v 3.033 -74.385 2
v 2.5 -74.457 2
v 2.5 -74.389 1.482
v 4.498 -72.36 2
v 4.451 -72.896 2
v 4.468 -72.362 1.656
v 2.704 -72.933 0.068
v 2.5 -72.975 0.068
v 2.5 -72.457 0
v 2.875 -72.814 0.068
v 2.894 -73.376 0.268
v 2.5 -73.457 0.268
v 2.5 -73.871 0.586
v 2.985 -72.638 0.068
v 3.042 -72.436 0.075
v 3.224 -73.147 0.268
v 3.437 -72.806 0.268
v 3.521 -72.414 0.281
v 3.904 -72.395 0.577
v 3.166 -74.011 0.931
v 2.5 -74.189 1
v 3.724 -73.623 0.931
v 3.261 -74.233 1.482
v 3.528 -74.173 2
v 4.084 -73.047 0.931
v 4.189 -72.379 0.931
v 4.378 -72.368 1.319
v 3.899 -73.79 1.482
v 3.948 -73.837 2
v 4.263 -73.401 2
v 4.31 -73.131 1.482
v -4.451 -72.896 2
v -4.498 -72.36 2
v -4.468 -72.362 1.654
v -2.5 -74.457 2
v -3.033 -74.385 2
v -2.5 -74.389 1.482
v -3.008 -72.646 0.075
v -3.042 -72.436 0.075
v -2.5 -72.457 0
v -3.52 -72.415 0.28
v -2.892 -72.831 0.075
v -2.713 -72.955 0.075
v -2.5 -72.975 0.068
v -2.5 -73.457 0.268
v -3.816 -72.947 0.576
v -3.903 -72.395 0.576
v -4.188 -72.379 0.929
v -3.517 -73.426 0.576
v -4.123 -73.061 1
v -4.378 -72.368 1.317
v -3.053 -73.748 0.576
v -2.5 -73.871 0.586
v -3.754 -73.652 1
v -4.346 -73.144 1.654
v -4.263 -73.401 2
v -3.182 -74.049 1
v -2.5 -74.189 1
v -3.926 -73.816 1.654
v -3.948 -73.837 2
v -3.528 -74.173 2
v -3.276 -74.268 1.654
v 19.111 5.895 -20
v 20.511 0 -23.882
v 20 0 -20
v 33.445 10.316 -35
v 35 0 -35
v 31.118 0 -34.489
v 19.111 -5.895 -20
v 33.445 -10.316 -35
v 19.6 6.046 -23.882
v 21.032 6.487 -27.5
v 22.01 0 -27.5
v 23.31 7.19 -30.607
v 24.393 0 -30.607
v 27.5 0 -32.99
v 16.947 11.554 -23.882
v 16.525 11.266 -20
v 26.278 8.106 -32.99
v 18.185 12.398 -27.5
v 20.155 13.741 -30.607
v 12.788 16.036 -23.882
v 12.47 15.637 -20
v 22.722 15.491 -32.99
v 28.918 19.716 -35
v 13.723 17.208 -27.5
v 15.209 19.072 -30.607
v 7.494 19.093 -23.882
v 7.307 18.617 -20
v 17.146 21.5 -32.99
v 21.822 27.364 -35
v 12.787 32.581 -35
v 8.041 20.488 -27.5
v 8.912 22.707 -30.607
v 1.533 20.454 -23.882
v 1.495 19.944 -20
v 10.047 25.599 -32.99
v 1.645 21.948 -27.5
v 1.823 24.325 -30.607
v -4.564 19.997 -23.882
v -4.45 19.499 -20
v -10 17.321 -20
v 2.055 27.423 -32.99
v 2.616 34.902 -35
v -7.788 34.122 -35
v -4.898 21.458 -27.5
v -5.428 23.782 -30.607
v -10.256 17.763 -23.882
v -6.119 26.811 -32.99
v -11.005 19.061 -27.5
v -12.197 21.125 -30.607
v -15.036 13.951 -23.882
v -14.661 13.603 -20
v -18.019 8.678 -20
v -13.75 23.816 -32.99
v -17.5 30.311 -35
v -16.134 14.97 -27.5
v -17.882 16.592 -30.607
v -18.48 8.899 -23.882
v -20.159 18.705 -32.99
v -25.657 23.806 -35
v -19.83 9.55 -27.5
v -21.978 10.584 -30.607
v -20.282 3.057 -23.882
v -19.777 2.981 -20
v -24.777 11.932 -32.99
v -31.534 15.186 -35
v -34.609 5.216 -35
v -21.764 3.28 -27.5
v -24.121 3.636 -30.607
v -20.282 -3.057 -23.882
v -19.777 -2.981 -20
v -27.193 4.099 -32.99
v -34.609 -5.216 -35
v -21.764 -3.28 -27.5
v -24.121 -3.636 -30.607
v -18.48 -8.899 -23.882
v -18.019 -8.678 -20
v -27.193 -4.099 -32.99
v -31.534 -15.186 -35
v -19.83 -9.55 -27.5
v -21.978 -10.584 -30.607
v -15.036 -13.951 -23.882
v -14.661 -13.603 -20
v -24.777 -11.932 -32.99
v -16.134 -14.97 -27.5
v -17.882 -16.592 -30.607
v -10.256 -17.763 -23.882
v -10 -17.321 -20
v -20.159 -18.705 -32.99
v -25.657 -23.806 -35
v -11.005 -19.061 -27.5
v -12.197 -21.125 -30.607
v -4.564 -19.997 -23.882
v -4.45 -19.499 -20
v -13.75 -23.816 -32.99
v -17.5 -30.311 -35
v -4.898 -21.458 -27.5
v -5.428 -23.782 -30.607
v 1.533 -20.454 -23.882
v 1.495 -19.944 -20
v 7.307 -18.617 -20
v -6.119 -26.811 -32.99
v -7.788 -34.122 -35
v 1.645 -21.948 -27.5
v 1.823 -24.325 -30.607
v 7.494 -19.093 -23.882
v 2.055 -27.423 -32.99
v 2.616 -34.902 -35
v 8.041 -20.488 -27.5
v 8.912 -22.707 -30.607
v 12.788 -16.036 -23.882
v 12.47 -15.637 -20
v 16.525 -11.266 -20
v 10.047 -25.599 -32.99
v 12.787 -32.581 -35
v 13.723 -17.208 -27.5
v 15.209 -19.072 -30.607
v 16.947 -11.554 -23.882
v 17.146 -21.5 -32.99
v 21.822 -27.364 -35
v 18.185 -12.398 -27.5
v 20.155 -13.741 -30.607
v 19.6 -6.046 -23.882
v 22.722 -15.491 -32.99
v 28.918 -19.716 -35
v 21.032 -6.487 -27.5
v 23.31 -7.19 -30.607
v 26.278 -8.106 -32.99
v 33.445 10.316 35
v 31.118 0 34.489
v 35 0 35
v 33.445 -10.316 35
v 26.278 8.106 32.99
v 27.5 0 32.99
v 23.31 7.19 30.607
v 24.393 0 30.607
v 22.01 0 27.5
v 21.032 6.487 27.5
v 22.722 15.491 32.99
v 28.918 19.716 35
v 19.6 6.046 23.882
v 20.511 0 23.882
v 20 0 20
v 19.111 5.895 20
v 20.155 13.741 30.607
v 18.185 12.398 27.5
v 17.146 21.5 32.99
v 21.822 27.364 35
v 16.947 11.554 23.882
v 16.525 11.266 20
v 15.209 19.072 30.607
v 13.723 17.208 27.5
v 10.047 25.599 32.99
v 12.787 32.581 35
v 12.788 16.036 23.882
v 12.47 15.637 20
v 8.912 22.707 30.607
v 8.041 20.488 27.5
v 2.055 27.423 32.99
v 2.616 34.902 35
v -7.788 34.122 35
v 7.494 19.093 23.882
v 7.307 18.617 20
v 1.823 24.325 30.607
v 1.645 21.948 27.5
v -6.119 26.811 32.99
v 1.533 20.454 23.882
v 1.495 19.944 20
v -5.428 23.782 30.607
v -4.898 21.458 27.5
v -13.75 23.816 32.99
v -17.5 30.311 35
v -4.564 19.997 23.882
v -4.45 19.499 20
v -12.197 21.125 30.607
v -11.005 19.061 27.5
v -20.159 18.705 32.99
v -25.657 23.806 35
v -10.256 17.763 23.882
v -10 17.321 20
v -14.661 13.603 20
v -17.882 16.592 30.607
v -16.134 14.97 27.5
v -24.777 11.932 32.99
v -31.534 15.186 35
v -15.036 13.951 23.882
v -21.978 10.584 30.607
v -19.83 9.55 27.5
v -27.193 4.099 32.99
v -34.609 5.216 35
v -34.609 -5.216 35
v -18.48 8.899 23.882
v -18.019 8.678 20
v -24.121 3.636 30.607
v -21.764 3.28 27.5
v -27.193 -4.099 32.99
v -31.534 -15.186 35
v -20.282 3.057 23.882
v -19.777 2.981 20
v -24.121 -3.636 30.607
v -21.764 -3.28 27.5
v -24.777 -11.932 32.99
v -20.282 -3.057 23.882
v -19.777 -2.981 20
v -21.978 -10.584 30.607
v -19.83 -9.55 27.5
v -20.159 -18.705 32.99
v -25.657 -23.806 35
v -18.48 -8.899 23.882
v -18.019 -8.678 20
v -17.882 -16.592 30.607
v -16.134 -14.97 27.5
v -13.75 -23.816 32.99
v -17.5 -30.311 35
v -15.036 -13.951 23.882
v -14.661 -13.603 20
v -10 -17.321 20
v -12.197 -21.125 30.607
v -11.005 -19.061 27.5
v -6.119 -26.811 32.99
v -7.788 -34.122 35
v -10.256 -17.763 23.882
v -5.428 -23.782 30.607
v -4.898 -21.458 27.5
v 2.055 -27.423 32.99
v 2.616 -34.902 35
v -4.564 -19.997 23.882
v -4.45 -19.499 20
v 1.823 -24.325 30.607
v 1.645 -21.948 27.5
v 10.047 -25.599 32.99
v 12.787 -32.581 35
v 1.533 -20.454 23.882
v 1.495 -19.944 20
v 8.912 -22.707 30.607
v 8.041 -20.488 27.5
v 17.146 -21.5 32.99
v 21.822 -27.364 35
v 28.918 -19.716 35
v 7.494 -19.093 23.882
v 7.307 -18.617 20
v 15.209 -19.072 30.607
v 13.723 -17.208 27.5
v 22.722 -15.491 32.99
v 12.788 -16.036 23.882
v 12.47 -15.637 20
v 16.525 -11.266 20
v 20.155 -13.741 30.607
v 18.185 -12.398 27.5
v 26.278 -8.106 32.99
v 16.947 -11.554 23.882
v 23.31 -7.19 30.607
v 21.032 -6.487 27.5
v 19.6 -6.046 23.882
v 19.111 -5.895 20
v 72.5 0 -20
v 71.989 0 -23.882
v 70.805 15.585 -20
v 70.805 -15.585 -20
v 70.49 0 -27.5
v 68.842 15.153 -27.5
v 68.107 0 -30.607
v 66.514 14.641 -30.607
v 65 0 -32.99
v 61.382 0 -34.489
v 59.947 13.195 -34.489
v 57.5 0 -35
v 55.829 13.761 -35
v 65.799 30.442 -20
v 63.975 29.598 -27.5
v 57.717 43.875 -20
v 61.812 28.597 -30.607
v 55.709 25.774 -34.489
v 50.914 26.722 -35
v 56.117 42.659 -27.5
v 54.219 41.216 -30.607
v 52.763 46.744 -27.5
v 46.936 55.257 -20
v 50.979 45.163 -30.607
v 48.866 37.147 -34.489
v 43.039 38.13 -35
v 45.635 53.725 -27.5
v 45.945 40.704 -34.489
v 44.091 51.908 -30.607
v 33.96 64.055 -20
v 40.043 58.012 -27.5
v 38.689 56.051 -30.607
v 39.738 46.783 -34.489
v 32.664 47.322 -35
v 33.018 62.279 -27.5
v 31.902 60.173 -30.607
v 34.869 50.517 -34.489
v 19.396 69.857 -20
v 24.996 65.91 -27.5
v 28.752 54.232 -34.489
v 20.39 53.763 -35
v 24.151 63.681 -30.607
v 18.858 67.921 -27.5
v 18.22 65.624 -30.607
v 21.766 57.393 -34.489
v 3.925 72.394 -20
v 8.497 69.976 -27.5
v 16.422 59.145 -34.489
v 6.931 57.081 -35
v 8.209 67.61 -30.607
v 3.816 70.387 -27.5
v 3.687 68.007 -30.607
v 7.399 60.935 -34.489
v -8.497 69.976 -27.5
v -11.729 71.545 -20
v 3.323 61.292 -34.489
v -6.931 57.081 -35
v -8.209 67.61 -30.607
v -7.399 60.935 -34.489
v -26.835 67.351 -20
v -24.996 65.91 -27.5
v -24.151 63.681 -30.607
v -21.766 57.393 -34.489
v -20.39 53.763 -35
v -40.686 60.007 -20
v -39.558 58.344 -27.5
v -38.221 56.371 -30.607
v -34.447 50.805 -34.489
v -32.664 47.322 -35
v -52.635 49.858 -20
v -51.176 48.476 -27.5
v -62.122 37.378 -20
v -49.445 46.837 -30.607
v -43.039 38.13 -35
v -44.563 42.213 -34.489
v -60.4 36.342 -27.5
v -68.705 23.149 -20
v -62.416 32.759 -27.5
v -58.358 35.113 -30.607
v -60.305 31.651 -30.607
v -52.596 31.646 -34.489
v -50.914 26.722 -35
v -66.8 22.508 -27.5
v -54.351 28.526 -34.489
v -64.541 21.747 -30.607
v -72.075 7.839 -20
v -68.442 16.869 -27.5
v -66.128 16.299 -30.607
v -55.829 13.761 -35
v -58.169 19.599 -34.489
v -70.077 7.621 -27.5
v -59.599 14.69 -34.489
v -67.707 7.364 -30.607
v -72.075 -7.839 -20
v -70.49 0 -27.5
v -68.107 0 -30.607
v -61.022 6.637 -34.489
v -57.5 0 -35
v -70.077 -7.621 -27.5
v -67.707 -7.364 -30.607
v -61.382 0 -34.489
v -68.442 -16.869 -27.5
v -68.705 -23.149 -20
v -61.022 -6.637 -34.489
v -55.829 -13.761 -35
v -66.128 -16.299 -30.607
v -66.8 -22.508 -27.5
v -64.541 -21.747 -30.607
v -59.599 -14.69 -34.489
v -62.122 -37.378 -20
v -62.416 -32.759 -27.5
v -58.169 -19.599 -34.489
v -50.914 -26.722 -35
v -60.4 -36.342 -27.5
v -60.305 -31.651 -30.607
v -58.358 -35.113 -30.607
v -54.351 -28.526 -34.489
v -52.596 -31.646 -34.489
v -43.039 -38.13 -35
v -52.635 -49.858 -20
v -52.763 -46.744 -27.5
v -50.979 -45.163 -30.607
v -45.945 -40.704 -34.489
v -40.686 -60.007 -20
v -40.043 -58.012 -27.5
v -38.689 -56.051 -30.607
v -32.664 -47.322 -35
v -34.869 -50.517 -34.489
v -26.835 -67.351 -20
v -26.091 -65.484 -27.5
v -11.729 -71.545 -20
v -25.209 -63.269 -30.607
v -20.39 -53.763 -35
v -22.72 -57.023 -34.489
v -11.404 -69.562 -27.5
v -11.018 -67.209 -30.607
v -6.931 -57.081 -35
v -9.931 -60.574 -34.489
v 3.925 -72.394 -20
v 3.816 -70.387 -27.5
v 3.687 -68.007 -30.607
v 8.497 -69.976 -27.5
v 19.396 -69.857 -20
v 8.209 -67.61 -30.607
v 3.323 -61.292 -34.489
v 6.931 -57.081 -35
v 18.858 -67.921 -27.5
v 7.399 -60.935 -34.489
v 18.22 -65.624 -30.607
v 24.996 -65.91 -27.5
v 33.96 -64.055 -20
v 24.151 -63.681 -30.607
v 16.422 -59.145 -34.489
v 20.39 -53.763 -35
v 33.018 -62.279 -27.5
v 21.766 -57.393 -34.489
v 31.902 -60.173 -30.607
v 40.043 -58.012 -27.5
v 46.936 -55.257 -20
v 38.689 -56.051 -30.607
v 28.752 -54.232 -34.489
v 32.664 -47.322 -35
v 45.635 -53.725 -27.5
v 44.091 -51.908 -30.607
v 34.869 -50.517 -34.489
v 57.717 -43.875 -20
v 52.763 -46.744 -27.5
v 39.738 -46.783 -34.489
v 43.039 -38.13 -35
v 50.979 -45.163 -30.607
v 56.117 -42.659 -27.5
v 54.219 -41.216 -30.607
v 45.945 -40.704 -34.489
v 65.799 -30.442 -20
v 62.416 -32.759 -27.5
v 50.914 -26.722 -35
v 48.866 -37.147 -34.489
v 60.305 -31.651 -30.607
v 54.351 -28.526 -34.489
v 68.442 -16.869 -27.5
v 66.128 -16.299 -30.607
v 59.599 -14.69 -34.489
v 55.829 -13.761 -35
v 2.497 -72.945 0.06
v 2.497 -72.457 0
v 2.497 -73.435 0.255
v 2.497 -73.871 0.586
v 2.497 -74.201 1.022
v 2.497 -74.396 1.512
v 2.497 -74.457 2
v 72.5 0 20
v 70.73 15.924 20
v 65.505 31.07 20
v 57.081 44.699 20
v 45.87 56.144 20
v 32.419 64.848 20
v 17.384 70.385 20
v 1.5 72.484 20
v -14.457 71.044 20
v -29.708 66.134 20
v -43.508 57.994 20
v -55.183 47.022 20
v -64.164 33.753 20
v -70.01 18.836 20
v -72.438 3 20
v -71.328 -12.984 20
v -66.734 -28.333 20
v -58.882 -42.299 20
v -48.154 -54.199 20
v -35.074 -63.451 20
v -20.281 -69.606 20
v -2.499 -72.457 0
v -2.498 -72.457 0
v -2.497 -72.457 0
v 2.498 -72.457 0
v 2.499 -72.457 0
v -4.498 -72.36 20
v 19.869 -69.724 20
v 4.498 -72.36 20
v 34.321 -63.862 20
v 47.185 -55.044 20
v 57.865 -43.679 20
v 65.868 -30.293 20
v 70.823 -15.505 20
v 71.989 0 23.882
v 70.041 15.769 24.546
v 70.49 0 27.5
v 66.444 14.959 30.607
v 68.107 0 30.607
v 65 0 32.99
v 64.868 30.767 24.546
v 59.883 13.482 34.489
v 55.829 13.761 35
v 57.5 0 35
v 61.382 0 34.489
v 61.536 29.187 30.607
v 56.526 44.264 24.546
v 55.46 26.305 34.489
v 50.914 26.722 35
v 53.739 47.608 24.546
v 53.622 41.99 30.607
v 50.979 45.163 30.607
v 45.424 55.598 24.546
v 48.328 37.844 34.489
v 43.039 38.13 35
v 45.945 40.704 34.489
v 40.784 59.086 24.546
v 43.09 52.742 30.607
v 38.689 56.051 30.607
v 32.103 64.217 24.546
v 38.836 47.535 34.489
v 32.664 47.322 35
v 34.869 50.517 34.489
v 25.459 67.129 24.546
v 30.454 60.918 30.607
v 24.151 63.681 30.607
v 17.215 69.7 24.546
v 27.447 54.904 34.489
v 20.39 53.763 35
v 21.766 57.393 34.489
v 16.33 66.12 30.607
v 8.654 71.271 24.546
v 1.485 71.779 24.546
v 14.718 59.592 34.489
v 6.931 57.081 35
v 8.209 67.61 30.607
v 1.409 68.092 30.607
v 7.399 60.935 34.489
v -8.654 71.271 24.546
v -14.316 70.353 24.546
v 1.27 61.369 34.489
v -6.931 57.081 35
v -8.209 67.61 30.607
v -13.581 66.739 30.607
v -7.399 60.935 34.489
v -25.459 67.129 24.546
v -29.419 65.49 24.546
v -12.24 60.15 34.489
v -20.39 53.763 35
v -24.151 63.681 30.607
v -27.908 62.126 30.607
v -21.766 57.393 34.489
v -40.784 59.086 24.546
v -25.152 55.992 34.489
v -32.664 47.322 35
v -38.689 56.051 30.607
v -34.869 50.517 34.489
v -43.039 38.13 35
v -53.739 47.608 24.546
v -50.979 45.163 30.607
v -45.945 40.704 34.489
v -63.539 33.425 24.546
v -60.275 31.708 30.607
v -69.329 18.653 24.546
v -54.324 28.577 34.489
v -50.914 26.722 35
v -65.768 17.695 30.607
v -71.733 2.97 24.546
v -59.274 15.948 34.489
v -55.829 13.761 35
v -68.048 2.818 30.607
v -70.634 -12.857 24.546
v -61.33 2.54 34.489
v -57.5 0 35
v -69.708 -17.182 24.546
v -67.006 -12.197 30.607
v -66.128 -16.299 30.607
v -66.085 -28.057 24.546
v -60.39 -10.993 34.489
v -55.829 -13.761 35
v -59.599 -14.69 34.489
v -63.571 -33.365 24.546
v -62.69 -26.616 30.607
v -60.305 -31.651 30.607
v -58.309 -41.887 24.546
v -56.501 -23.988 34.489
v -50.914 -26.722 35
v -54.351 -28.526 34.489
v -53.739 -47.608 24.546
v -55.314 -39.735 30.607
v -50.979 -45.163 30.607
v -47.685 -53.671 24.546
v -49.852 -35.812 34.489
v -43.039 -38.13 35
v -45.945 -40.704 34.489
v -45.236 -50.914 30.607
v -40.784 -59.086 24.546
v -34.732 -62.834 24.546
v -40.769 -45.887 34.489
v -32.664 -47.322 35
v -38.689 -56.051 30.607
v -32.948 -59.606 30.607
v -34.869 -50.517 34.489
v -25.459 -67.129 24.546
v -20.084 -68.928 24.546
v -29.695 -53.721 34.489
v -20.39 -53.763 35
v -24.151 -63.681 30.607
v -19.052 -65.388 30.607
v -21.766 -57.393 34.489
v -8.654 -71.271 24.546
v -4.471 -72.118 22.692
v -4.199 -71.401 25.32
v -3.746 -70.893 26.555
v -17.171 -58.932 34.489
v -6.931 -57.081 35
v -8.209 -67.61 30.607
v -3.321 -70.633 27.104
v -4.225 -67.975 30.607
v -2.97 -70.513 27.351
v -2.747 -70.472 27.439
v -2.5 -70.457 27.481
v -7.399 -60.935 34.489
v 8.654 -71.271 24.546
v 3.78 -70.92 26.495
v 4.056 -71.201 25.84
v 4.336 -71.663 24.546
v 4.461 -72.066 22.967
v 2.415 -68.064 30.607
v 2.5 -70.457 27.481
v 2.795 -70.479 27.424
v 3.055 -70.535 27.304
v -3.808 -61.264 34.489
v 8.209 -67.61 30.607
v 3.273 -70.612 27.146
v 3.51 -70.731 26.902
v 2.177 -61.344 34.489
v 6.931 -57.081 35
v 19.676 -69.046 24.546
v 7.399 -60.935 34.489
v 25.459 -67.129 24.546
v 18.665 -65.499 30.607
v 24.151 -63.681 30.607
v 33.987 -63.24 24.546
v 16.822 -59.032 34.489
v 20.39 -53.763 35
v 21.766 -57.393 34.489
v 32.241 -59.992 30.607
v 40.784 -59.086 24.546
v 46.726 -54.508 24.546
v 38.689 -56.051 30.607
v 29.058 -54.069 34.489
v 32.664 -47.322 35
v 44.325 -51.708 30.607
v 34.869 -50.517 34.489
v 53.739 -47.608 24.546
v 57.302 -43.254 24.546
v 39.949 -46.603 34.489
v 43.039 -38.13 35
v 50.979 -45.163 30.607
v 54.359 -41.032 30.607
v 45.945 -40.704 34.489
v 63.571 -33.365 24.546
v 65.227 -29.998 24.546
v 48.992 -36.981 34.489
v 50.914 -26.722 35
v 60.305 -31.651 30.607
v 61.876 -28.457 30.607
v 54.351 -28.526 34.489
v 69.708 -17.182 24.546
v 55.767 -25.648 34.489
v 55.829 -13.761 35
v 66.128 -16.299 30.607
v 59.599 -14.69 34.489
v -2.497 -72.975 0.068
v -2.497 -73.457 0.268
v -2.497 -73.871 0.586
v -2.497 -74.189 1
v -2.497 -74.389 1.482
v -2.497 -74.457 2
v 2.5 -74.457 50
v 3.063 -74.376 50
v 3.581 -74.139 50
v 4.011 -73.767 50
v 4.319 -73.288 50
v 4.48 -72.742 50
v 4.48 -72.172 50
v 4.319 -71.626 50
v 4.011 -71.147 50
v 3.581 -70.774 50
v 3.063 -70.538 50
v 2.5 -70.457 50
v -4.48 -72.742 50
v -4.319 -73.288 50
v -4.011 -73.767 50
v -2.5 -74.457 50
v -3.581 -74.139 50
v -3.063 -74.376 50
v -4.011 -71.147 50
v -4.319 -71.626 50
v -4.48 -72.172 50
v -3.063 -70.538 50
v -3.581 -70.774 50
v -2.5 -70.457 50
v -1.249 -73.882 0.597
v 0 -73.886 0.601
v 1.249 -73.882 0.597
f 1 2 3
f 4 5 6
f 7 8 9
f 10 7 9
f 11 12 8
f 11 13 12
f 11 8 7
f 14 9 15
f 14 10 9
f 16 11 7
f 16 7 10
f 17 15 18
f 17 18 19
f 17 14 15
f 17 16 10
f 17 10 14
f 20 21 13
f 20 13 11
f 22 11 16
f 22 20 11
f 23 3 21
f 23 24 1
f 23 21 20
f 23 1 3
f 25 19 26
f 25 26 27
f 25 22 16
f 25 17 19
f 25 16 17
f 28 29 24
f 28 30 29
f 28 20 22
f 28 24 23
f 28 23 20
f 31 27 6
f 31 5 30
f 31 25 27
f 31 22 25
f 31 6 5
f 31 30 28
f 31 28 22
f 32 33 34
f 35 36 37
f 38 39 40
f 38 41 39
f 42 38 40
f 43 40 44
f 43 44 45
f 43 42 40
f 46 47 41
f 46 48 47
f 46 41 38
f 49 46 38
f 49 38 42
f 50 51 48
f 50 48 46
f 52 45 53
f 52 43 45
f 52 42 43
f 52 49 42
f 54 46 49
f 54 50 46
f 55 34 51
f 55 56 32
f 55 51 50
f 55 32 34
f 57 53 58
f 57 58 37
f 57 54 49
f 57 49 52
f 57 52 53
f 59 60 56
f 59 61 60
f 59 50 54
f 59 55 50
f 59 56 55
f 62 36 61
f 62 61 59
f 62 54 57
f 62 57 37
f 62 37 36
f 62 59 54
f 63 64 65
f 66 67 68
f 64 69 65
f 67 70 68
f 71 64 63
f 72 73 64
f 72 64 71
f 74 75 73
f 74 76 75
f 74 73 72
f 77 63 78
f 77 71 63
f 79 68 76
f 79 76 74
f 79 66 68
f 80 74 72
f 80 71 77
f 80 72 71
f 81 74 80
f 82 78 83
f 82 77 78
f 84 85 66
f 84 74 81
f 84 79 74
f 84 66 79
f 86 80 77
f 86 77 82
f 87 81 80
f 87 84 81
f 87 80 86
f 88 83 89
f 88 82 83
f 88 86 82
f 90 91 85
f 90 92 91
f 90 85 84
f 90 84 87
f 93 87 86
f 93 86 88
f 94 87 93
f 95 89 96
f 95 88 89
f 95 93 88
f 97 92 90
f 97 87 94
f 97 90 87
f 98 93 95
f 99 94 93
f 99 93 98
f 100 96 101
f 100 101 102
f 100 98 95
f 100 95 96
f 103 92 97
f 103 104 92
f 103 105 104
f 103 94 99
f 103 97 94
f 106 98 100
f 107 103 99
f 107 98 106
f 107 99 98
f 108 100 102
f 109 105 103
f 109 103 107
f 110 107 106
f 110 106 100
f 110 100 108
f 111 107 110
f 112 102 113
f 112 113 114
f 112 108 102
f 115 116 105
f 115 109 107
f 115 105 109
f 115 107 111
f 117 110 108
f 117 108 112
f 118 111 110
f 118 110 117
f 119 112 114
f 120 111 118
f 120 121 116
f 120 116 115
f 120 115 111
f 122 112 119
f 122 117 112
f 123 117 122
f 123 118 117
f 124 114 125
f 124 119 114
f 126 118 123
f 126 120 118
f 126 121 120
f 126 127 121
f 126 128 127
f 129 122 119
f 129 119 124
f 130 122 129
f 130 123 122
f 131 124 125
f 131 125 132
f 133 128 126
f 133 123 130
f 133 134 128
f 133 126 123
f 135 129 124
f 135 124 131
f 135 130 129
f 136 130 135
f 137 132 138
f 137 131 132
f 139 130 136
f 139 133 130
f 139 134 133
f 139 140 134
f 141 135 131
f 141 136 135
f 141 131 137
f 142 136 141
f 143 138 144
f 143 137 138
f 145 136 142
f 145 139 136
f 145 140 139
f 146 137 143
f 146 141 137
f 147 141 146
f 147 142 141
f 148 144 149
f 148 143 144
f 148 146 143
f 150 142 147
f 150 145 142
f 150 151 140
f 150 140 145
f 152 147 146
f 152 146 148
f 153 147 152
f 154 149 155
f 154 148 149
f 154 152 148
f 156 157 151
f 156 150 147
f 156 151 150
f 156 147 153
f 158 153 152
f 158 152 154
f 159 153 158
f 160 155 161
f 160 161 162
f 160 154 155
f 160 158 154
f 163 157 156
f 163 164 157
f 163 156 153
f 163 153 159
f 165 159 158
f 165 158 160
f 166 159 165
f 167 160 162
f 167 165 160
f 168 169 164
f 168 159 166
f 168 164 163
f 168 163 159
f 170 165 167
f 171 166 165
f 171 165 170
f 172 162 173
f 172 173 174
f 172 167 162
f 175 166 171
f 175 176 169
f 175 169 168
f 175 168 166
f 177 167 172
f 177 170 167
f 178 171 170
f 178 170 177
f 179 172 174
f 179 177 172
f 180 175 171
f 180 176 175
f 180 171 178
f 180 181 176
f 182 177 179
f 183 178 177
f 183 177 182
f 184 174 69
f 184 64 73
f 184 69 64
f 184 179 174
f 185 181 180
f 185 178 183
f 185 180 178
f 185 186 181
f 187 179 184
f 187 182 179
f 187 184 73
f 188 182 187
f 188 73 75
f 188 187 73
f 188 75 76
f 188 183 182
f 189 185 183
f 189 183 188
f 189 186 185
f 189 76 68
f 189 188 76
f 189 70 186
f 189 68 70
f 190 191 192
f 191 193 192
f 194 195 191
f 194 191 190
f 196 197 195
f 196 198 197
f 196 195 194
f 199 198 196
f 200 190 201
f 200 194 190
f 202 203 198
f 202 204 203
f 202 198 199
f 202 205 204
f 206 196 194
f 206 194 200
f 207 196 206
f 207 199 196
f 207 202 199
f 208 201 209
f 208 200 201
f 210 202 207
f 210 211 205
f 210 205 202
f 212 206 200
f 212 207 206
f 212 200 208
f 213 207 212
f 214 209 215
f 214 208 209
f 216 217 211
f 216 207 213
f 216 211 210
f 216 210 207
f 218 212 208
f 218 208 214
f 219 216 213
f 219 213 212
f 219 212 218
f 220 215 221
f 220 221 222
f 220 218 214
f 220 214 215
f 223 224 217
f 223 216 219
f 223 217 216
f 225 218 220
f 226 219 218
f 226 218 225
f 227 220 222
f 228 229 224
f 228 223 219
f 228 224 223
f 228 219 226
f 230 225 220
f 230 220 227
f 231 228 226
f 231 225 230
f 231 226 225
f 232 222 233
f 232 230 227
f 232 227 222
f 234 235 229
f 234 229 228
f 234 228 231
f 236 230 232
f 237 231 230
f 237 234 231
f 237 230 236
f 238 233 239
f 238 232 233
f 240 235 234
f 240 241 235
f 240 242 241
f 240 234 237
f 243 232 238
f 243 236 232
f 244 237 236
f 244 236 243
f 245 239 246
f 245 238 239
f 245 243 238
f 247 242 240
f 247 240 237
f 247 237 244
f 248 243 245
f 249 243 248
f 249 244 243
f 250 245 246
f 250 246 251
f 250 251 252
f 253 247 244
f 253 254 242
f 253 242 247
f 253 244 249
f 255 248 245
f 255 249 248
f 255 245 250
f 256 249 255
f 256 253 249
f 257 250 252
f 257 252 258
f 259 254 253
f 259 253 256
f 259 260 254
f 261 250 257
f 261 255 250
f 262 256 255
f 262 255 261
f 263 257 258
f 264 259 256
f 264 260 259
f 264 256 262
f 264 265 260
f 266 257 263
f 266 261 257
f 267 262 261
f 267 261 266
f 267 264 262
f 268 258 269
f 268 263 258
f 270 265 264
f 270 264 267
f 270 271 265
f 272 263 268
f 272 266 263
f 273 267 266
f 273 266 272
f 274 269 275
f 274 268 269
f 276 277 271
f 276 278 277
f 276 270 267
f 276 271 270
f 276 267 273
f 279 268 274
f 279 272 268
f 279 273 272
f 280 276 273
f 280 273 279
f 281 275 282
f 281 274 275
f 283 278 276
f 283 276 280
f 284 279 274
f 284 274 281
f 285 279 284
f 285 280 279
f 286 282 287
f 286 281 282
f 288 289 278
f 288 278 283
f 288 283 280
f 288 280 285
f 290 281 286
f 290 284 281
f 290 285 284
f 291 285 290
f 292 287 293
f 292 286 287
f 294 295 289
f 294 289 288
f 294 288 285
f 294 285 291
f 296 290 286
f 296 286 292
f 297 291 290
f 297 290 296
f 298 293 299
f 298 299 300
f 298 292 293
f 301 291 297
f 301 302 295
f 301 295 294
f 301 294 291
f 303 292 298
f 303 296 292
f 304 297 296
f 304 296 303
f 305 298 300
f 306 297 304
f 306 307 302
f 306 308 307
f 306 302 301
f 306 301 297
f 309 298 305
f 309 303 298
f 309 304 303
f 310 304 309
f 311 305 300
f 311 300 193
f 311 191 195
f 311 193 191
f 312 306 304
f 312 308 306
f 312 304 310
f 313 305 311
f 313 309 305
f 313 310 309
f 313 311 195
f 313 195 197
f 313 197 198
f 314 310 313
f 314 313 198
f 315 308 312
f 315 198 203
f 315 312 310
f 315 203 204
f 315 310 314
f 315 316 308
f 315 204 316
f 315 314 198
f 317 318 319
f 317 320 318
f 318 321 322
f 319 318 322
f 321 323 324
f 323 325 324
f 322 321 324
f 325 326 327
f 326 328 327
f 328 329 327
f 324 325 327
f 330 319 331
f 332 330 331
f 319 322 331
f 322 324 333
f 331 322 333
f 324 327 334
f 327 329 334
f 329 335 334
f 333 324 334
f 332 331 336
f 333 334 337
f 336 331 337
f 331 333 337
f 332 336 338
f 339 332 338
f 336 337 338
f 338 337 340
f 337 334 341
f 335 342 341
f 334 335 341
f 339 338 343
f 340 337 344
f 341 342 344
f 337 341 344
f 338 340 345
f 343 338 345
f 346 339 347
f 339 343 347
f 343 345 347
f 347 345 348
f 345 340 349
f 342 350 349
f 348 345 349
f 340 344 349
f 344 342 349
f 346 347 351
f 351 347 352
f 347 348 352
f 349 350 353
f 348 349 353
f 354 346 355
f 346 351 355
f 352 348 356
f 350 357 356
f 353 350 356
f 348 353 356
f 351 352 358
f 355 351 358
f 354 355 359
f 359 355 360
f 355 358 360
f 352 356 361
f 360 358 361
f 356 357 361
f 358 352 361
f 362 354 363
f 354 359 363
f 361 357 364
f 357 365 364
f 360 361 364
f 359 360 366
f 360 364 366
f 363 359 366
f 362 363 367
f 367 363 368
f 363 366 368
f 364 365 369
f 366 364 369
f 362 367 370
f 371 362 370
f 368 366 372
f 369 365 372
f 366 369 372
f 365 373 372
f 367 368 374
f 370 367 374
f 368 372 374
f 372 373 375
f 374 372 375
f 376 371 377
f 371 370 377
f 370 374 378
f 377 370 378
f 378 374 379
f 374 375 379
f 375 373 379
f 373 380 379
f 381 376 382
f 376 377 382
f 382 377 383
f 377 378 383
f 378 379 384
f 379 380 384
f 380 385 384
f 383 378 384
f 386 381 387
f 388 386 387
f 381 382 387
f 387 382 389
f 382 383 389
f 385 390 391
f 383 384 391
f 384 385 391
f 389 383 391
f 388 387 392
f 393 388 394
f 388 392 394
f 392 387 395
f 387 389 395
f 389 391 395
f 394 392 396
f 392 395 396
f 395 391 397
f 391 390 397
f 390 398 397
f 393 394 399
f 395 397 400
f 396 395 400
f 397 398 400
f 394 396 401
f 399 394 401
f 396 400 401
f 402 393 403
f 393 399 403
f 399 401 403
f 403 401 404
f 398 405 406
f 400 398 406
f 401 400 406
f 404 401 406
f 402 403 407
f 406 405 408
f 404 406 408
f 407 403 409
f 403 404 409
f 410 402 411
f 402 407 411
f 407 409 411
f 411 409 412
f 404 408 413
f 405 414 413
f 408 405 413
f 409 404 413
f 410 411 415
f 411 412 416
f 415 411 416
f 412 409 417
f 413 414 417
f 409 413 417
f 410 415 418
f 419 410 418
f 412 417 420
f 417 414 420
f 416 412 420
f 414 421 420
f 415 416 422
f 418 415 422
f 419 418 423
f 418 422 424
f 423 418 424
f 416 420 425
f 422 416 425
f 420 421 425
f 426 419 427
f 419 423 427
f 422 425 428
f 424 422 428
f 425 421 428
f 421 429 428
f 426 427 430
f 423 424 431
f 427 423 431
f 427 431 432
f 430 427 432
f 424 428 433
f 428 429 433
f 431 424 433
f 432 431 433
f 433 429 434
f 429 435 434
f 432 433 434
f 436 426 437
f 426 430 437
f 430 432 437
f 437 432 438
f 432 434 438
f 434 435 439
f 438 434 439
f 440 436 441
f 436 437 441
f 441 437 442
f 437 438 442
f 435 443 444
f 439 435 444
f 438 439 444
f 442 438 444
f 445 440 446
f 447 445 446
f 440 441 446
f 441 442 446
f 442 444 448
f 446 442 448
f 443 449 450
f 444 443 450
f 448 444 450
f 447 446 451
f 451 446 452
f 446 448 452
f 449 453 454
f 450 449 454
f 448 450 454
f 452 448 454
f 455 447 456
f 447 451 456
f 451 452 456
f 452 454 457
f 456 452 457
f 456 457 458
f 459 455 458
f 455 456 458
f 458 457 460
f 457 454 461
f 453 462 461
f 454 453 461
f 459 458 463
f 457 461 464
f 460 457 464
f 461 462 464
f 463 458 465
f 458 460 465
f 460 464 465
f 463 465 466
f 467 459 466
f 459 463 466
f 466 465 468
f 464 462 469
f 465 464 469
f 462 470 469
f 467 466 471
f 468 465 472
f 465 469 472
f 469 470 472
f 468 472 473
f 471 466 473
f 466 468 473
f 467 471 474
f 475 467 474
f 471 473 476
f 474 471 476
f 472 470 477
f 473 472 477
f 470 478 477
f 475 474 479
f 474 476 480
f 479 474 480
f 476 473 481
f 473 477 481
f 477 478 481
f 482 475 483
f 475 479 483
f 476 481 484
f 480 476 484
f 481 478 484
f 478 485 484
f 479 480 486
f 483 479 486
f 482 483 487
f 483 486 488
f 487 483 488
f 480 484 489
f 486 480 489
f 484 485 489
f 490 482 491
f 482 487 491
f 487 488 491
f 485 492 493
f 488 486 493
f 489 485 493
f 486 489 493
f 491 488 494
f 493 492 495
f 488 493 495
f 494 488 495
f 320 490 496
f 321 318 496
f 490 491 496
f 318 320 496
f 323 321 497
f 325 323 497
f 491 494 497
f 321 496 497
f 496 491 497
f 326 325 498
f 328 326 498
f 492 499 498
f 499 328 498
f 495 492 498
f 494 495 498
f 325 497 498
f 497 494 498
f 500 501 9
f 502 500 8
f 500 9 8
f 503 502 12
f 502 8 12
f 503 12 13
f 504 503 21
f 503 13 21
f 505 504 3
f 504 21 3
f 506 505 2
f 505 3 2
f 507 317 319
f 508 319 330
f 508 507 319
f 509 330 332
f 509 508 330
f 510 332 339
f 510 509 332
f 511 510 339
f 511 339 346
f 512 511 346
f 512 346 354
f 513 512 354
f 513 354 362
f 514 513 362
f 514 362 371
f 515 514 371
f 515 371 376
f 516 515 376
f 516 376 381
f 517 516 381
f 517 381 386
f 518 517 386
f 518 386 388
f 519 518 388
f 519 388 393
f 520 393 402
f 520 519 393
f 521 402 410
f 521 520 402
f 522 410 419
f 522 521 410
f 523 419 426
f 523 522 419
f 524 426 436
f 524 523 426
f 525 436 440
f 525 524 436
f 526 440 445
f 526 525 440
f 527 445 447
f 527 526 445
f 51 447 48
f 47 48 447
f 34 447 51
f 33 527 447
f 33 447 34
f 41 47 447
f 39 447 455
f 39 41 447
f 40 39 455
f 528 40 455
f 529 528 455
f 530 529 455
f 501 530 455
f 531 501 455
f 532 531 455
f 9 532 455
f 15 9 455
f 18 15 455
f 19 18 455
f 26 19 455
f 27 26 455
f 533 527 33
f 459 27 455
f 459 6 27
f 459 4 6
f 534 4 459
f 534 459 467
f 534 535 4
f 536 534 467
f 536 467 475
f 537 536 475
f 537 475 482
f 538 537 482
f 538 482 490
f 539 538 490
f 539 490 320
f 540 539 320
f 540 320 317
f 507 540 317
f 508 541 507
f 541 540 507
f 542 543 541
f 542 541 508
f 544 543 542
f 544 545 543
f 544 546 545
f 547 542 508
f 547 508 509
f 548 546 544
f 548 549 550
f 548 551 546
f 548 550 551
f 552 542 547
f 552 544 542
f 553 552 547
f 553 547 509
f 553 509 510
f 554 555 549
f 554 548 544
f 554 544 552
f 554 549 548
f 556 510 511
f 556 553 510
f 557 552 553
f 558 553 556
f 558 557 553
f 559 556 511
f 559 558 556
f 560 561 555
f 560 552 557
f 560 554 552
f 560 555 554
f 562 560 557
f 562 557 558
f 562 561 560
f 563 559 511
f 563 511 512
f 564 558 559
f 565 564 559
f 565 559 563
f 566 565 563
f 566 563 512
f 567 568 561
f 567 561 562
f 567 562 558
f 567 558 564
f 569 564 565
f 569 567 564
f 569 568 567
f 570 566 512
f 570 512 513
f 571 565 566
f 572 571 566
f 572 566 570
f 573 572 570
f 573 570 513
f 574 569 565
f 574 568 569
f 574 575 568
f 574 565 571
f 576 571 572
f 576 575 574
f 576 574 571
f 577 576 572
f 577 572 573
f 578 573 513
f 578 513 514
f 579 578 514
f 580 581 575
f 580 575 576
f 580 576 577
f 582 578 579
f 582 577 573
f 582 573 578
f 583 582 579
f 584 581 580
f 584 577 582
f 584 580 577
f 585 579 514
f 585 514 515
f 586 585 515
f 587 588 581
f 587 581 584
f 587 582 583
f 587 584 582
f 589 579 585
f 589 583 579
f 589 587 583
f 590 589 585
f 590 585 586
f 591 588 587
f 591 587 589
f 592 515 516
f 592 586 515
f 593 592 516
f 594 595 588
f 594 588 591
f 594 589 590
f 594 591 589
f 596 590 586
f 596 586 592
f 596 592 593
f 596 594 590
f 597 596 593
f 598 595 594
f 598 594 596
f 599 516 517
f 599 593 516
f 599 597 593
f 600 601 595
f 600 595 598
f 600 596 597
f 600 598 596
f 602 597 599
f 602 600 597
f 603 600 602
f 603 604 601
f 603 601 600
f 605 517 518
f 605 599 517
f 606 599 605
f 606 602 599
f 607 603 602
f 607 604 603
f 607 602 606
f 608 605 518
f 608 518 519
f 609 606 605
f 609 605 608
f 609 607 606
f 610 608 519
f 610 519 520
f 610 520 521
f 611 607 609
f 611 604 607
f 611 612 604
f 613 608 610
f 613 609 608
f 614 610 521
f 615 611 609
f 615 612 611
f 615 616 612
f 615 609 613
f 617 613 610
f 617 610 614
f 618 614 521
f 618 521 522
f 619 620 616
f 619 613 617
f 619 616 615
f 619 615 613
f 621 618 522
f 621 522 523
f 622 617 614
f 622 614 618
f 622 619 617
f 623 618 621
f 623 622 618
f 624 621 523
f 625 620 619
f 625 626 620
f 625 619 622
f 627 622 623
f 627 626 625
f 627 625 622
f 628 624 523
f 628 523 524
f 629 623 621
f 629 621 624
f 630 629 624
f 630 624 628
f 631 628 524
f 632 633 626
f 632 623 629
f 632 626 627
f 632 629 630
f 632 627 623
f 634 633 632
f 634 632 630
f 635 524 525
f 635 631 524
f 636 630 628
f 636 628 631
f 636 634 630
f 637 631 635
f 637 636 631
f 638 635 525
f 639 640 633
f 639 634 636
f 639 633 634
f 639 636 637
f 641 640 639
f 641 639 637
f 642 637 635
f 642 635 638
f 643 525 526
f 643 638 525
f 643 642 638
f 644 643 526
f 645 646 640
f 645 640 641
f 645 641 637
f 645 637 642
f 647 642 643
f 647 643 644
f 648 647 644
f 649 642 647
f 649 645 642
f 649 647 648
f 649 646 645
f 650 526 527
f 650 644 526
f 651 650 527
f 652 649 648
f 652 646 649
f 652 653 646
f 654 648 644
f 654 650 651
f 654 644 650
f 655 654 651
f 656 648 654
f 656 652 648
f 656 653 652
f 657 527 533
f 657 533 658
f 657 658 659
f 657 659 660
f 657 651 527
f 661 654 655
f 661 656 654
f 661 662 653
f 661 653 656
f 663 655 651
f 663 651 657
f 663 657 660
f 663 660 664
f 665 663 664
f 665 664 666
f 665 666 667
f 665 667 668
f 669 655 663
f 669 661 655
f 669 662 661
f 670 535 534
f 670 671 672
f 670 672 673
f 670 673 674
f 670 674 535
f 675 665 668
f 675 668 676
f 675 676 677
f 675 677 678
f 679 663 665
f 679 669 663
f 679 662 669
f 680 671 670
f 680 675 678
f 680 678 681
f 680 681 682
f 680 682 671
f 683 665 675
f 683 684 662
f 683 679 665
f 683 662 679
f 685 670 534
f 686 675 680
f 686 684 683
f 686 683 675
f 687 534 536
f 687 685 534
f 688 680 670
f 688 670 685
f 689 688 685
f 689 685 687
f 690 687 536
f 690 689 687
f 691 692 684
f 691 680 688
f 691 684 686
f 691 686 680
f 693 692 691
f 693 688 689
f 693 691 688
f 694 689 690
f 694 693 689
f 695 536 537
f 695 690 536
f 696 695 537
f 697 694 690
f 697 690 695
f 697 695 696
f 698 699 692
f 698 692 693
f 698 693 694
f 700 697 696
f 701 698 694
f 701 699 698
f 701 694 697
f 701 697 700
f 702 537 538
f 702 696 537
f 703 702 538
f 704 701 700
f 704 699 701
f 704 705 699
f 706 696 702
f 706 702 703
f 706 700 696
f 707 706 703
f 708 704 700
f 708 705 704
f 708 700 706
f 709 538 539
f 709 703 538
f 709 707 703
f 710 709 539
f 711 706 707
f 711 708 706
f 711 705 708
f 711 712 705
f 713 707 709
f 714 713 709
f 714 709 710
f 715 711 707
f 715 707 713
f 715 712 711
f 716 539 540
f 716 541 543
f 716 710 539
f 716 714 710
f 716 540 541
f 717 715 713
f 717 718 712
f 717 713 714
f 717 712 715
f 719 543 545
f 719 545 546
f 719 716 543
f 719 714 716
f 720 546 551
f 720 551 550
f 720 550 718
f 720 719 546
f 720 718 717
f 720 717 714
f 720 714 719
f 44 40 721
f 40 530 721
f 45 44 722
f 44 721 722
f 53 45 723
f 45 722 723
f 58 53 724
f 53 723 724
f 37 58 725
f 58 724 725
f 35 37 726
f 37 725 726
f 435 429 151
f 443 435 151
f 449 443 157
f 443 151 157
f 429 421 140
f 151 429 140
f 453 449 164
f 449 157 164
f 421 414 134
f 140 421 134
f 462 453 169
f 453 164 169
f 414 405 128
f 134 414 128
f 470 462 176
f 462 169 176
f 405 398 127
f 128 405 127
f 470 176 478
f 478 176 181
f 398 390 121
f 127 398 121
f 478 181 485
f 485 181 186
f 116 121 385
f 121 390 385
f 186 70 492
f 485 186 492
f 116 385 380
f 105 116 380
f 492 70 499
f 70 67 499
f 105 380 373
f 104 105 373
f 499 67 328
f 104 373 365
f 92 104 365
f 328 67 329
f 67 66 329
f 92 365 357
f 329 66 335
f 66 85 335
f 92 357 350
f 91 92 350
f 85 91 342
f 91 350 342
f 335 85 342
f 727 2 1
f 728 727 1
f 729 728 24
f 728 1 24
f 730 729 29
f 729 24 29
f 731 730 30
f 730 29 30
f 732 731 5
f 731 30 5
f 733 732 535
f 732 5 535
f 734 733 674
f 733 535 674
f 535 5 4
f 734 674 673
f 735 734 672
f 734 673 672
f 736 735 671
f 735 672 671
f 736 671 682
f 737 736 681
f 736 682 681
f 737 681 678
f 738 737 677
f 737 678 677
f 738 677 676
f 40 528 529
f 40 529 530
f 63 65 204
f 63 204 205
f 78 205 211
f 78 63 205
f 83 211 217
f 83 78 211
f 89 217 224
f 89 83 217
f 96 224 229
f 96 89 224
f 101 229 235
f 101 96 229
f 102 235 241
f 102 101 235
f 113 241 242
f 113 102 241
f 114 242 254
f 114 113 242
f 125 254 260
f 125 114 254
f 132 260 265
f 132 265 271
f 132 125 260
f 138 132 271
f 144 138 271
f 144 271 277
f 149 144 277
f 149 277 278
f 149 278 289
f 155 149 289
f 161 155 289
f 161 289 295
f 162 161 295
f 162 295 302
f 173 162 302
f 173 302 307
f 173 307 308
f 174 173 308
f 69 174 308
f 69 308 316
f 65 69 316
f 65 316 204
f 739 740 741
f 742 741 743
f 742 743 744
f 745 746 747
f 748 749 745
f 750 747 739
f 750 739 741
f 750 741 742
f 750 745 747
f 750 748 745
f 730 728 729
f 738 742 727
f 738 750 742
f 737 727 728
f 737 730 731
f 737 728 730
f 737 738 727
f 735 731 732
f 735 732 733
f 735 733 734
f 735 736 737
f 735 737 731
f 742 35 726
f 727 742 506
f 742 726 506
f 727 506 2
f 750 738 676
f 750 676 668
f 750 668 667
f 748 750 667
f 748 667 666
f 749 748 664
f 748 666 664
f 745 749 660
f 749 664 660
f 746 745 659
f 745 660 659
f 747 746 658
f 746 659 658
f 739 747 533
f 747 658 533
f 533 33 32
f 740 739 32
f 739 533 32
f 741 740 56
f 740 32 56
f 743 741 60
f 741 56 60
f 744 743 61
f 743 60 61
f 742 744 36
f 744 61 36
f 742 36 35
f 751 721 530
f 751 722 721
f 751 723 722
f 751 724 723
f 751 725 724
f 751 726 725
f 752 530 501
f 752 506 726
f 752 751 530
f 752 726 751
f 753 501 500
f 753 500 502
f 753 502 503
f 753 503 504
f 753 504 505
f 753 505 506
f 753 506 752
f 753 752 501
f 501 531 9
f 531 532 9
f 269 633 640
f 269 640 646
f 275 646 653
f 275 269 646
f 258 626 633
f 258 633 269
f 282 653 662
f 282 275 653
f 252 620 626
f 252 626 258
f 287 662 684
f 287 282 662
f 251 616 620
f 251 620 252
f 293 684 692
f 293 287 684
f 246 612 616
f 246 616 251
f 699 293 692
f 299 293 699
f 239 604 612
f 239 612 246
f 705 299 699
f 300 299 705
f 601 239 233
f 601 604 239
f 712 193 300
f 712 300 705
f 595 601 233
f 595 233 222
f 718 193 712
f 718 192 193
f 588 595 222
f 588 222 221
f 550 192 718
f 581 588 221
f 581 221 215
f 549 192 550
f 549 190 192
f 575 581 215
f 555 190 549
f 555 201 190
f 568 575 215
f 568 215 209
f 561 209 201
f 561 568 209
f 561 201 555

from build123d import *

# Parameters (mm, degrees)
F0_R     = 72.5
F0_R_2   = 20
F1_DEPTH = 35
F2_R     = 15
F4_DEPTH = 50
F5_R     = 1.9999


# Not quite as in the source:
# - a fillet or chamfer is up to 0.001 mm smaller than in the source, because OpenCascade refuses the exact size


with BuildPart() as f1:
    # F0 (on Top) → F1 (new body, symmetric)
    with BuildSketch(Plane.XY):
        Circle(F0_R)
        Circle(F0_R_2, mode=Mode.SUBTRACT)
    extrude(amount=F1_DEPTH, both=True)

    # F2
    f2_edges = [f1.edges().sort_by_distance(p)[0] for p in [
        (-20, 0, 35),
        (20, 0, 0),
        (-20, 0, -35),
        (-72.5, 0, -35),
        (72.5, 0, 0),
        (-72.5, 0, 35),
    ]]
    fillet(f2_edges, radius=F2_R)

    # F3 (on Top) → F4 (join)
    with BuildSketch(Plane.XY):
        with BuildLine():
            Line((2.5, -70.4568837309), (-2.5, -70.4568837309))
            ThreePointArc((-2.5, -70.4568837309), (-4.5, -72.4568837309), (-2.5, -74.4568837309))
            Line((-2.5, -74.4568837309), (2.5, -74.4568837309))
            ThreePointArc((2.5, -74.4568837309), (4.5, -72.4568837309), (2.5, -70.4568837309))
        make_face()
    extrude(amount=F4_DEPTH)

    # F5 (radius 2 in the source; OpenCascade refuses exactly that, so slightly less here)
    f5_edges = [f1.edges().sort_by_distance(p)[0] for p in [
        (0, -74.456884, 0),
    ]]
    fillet(f5_edges, radius=F5_R)


solid = f1.part
